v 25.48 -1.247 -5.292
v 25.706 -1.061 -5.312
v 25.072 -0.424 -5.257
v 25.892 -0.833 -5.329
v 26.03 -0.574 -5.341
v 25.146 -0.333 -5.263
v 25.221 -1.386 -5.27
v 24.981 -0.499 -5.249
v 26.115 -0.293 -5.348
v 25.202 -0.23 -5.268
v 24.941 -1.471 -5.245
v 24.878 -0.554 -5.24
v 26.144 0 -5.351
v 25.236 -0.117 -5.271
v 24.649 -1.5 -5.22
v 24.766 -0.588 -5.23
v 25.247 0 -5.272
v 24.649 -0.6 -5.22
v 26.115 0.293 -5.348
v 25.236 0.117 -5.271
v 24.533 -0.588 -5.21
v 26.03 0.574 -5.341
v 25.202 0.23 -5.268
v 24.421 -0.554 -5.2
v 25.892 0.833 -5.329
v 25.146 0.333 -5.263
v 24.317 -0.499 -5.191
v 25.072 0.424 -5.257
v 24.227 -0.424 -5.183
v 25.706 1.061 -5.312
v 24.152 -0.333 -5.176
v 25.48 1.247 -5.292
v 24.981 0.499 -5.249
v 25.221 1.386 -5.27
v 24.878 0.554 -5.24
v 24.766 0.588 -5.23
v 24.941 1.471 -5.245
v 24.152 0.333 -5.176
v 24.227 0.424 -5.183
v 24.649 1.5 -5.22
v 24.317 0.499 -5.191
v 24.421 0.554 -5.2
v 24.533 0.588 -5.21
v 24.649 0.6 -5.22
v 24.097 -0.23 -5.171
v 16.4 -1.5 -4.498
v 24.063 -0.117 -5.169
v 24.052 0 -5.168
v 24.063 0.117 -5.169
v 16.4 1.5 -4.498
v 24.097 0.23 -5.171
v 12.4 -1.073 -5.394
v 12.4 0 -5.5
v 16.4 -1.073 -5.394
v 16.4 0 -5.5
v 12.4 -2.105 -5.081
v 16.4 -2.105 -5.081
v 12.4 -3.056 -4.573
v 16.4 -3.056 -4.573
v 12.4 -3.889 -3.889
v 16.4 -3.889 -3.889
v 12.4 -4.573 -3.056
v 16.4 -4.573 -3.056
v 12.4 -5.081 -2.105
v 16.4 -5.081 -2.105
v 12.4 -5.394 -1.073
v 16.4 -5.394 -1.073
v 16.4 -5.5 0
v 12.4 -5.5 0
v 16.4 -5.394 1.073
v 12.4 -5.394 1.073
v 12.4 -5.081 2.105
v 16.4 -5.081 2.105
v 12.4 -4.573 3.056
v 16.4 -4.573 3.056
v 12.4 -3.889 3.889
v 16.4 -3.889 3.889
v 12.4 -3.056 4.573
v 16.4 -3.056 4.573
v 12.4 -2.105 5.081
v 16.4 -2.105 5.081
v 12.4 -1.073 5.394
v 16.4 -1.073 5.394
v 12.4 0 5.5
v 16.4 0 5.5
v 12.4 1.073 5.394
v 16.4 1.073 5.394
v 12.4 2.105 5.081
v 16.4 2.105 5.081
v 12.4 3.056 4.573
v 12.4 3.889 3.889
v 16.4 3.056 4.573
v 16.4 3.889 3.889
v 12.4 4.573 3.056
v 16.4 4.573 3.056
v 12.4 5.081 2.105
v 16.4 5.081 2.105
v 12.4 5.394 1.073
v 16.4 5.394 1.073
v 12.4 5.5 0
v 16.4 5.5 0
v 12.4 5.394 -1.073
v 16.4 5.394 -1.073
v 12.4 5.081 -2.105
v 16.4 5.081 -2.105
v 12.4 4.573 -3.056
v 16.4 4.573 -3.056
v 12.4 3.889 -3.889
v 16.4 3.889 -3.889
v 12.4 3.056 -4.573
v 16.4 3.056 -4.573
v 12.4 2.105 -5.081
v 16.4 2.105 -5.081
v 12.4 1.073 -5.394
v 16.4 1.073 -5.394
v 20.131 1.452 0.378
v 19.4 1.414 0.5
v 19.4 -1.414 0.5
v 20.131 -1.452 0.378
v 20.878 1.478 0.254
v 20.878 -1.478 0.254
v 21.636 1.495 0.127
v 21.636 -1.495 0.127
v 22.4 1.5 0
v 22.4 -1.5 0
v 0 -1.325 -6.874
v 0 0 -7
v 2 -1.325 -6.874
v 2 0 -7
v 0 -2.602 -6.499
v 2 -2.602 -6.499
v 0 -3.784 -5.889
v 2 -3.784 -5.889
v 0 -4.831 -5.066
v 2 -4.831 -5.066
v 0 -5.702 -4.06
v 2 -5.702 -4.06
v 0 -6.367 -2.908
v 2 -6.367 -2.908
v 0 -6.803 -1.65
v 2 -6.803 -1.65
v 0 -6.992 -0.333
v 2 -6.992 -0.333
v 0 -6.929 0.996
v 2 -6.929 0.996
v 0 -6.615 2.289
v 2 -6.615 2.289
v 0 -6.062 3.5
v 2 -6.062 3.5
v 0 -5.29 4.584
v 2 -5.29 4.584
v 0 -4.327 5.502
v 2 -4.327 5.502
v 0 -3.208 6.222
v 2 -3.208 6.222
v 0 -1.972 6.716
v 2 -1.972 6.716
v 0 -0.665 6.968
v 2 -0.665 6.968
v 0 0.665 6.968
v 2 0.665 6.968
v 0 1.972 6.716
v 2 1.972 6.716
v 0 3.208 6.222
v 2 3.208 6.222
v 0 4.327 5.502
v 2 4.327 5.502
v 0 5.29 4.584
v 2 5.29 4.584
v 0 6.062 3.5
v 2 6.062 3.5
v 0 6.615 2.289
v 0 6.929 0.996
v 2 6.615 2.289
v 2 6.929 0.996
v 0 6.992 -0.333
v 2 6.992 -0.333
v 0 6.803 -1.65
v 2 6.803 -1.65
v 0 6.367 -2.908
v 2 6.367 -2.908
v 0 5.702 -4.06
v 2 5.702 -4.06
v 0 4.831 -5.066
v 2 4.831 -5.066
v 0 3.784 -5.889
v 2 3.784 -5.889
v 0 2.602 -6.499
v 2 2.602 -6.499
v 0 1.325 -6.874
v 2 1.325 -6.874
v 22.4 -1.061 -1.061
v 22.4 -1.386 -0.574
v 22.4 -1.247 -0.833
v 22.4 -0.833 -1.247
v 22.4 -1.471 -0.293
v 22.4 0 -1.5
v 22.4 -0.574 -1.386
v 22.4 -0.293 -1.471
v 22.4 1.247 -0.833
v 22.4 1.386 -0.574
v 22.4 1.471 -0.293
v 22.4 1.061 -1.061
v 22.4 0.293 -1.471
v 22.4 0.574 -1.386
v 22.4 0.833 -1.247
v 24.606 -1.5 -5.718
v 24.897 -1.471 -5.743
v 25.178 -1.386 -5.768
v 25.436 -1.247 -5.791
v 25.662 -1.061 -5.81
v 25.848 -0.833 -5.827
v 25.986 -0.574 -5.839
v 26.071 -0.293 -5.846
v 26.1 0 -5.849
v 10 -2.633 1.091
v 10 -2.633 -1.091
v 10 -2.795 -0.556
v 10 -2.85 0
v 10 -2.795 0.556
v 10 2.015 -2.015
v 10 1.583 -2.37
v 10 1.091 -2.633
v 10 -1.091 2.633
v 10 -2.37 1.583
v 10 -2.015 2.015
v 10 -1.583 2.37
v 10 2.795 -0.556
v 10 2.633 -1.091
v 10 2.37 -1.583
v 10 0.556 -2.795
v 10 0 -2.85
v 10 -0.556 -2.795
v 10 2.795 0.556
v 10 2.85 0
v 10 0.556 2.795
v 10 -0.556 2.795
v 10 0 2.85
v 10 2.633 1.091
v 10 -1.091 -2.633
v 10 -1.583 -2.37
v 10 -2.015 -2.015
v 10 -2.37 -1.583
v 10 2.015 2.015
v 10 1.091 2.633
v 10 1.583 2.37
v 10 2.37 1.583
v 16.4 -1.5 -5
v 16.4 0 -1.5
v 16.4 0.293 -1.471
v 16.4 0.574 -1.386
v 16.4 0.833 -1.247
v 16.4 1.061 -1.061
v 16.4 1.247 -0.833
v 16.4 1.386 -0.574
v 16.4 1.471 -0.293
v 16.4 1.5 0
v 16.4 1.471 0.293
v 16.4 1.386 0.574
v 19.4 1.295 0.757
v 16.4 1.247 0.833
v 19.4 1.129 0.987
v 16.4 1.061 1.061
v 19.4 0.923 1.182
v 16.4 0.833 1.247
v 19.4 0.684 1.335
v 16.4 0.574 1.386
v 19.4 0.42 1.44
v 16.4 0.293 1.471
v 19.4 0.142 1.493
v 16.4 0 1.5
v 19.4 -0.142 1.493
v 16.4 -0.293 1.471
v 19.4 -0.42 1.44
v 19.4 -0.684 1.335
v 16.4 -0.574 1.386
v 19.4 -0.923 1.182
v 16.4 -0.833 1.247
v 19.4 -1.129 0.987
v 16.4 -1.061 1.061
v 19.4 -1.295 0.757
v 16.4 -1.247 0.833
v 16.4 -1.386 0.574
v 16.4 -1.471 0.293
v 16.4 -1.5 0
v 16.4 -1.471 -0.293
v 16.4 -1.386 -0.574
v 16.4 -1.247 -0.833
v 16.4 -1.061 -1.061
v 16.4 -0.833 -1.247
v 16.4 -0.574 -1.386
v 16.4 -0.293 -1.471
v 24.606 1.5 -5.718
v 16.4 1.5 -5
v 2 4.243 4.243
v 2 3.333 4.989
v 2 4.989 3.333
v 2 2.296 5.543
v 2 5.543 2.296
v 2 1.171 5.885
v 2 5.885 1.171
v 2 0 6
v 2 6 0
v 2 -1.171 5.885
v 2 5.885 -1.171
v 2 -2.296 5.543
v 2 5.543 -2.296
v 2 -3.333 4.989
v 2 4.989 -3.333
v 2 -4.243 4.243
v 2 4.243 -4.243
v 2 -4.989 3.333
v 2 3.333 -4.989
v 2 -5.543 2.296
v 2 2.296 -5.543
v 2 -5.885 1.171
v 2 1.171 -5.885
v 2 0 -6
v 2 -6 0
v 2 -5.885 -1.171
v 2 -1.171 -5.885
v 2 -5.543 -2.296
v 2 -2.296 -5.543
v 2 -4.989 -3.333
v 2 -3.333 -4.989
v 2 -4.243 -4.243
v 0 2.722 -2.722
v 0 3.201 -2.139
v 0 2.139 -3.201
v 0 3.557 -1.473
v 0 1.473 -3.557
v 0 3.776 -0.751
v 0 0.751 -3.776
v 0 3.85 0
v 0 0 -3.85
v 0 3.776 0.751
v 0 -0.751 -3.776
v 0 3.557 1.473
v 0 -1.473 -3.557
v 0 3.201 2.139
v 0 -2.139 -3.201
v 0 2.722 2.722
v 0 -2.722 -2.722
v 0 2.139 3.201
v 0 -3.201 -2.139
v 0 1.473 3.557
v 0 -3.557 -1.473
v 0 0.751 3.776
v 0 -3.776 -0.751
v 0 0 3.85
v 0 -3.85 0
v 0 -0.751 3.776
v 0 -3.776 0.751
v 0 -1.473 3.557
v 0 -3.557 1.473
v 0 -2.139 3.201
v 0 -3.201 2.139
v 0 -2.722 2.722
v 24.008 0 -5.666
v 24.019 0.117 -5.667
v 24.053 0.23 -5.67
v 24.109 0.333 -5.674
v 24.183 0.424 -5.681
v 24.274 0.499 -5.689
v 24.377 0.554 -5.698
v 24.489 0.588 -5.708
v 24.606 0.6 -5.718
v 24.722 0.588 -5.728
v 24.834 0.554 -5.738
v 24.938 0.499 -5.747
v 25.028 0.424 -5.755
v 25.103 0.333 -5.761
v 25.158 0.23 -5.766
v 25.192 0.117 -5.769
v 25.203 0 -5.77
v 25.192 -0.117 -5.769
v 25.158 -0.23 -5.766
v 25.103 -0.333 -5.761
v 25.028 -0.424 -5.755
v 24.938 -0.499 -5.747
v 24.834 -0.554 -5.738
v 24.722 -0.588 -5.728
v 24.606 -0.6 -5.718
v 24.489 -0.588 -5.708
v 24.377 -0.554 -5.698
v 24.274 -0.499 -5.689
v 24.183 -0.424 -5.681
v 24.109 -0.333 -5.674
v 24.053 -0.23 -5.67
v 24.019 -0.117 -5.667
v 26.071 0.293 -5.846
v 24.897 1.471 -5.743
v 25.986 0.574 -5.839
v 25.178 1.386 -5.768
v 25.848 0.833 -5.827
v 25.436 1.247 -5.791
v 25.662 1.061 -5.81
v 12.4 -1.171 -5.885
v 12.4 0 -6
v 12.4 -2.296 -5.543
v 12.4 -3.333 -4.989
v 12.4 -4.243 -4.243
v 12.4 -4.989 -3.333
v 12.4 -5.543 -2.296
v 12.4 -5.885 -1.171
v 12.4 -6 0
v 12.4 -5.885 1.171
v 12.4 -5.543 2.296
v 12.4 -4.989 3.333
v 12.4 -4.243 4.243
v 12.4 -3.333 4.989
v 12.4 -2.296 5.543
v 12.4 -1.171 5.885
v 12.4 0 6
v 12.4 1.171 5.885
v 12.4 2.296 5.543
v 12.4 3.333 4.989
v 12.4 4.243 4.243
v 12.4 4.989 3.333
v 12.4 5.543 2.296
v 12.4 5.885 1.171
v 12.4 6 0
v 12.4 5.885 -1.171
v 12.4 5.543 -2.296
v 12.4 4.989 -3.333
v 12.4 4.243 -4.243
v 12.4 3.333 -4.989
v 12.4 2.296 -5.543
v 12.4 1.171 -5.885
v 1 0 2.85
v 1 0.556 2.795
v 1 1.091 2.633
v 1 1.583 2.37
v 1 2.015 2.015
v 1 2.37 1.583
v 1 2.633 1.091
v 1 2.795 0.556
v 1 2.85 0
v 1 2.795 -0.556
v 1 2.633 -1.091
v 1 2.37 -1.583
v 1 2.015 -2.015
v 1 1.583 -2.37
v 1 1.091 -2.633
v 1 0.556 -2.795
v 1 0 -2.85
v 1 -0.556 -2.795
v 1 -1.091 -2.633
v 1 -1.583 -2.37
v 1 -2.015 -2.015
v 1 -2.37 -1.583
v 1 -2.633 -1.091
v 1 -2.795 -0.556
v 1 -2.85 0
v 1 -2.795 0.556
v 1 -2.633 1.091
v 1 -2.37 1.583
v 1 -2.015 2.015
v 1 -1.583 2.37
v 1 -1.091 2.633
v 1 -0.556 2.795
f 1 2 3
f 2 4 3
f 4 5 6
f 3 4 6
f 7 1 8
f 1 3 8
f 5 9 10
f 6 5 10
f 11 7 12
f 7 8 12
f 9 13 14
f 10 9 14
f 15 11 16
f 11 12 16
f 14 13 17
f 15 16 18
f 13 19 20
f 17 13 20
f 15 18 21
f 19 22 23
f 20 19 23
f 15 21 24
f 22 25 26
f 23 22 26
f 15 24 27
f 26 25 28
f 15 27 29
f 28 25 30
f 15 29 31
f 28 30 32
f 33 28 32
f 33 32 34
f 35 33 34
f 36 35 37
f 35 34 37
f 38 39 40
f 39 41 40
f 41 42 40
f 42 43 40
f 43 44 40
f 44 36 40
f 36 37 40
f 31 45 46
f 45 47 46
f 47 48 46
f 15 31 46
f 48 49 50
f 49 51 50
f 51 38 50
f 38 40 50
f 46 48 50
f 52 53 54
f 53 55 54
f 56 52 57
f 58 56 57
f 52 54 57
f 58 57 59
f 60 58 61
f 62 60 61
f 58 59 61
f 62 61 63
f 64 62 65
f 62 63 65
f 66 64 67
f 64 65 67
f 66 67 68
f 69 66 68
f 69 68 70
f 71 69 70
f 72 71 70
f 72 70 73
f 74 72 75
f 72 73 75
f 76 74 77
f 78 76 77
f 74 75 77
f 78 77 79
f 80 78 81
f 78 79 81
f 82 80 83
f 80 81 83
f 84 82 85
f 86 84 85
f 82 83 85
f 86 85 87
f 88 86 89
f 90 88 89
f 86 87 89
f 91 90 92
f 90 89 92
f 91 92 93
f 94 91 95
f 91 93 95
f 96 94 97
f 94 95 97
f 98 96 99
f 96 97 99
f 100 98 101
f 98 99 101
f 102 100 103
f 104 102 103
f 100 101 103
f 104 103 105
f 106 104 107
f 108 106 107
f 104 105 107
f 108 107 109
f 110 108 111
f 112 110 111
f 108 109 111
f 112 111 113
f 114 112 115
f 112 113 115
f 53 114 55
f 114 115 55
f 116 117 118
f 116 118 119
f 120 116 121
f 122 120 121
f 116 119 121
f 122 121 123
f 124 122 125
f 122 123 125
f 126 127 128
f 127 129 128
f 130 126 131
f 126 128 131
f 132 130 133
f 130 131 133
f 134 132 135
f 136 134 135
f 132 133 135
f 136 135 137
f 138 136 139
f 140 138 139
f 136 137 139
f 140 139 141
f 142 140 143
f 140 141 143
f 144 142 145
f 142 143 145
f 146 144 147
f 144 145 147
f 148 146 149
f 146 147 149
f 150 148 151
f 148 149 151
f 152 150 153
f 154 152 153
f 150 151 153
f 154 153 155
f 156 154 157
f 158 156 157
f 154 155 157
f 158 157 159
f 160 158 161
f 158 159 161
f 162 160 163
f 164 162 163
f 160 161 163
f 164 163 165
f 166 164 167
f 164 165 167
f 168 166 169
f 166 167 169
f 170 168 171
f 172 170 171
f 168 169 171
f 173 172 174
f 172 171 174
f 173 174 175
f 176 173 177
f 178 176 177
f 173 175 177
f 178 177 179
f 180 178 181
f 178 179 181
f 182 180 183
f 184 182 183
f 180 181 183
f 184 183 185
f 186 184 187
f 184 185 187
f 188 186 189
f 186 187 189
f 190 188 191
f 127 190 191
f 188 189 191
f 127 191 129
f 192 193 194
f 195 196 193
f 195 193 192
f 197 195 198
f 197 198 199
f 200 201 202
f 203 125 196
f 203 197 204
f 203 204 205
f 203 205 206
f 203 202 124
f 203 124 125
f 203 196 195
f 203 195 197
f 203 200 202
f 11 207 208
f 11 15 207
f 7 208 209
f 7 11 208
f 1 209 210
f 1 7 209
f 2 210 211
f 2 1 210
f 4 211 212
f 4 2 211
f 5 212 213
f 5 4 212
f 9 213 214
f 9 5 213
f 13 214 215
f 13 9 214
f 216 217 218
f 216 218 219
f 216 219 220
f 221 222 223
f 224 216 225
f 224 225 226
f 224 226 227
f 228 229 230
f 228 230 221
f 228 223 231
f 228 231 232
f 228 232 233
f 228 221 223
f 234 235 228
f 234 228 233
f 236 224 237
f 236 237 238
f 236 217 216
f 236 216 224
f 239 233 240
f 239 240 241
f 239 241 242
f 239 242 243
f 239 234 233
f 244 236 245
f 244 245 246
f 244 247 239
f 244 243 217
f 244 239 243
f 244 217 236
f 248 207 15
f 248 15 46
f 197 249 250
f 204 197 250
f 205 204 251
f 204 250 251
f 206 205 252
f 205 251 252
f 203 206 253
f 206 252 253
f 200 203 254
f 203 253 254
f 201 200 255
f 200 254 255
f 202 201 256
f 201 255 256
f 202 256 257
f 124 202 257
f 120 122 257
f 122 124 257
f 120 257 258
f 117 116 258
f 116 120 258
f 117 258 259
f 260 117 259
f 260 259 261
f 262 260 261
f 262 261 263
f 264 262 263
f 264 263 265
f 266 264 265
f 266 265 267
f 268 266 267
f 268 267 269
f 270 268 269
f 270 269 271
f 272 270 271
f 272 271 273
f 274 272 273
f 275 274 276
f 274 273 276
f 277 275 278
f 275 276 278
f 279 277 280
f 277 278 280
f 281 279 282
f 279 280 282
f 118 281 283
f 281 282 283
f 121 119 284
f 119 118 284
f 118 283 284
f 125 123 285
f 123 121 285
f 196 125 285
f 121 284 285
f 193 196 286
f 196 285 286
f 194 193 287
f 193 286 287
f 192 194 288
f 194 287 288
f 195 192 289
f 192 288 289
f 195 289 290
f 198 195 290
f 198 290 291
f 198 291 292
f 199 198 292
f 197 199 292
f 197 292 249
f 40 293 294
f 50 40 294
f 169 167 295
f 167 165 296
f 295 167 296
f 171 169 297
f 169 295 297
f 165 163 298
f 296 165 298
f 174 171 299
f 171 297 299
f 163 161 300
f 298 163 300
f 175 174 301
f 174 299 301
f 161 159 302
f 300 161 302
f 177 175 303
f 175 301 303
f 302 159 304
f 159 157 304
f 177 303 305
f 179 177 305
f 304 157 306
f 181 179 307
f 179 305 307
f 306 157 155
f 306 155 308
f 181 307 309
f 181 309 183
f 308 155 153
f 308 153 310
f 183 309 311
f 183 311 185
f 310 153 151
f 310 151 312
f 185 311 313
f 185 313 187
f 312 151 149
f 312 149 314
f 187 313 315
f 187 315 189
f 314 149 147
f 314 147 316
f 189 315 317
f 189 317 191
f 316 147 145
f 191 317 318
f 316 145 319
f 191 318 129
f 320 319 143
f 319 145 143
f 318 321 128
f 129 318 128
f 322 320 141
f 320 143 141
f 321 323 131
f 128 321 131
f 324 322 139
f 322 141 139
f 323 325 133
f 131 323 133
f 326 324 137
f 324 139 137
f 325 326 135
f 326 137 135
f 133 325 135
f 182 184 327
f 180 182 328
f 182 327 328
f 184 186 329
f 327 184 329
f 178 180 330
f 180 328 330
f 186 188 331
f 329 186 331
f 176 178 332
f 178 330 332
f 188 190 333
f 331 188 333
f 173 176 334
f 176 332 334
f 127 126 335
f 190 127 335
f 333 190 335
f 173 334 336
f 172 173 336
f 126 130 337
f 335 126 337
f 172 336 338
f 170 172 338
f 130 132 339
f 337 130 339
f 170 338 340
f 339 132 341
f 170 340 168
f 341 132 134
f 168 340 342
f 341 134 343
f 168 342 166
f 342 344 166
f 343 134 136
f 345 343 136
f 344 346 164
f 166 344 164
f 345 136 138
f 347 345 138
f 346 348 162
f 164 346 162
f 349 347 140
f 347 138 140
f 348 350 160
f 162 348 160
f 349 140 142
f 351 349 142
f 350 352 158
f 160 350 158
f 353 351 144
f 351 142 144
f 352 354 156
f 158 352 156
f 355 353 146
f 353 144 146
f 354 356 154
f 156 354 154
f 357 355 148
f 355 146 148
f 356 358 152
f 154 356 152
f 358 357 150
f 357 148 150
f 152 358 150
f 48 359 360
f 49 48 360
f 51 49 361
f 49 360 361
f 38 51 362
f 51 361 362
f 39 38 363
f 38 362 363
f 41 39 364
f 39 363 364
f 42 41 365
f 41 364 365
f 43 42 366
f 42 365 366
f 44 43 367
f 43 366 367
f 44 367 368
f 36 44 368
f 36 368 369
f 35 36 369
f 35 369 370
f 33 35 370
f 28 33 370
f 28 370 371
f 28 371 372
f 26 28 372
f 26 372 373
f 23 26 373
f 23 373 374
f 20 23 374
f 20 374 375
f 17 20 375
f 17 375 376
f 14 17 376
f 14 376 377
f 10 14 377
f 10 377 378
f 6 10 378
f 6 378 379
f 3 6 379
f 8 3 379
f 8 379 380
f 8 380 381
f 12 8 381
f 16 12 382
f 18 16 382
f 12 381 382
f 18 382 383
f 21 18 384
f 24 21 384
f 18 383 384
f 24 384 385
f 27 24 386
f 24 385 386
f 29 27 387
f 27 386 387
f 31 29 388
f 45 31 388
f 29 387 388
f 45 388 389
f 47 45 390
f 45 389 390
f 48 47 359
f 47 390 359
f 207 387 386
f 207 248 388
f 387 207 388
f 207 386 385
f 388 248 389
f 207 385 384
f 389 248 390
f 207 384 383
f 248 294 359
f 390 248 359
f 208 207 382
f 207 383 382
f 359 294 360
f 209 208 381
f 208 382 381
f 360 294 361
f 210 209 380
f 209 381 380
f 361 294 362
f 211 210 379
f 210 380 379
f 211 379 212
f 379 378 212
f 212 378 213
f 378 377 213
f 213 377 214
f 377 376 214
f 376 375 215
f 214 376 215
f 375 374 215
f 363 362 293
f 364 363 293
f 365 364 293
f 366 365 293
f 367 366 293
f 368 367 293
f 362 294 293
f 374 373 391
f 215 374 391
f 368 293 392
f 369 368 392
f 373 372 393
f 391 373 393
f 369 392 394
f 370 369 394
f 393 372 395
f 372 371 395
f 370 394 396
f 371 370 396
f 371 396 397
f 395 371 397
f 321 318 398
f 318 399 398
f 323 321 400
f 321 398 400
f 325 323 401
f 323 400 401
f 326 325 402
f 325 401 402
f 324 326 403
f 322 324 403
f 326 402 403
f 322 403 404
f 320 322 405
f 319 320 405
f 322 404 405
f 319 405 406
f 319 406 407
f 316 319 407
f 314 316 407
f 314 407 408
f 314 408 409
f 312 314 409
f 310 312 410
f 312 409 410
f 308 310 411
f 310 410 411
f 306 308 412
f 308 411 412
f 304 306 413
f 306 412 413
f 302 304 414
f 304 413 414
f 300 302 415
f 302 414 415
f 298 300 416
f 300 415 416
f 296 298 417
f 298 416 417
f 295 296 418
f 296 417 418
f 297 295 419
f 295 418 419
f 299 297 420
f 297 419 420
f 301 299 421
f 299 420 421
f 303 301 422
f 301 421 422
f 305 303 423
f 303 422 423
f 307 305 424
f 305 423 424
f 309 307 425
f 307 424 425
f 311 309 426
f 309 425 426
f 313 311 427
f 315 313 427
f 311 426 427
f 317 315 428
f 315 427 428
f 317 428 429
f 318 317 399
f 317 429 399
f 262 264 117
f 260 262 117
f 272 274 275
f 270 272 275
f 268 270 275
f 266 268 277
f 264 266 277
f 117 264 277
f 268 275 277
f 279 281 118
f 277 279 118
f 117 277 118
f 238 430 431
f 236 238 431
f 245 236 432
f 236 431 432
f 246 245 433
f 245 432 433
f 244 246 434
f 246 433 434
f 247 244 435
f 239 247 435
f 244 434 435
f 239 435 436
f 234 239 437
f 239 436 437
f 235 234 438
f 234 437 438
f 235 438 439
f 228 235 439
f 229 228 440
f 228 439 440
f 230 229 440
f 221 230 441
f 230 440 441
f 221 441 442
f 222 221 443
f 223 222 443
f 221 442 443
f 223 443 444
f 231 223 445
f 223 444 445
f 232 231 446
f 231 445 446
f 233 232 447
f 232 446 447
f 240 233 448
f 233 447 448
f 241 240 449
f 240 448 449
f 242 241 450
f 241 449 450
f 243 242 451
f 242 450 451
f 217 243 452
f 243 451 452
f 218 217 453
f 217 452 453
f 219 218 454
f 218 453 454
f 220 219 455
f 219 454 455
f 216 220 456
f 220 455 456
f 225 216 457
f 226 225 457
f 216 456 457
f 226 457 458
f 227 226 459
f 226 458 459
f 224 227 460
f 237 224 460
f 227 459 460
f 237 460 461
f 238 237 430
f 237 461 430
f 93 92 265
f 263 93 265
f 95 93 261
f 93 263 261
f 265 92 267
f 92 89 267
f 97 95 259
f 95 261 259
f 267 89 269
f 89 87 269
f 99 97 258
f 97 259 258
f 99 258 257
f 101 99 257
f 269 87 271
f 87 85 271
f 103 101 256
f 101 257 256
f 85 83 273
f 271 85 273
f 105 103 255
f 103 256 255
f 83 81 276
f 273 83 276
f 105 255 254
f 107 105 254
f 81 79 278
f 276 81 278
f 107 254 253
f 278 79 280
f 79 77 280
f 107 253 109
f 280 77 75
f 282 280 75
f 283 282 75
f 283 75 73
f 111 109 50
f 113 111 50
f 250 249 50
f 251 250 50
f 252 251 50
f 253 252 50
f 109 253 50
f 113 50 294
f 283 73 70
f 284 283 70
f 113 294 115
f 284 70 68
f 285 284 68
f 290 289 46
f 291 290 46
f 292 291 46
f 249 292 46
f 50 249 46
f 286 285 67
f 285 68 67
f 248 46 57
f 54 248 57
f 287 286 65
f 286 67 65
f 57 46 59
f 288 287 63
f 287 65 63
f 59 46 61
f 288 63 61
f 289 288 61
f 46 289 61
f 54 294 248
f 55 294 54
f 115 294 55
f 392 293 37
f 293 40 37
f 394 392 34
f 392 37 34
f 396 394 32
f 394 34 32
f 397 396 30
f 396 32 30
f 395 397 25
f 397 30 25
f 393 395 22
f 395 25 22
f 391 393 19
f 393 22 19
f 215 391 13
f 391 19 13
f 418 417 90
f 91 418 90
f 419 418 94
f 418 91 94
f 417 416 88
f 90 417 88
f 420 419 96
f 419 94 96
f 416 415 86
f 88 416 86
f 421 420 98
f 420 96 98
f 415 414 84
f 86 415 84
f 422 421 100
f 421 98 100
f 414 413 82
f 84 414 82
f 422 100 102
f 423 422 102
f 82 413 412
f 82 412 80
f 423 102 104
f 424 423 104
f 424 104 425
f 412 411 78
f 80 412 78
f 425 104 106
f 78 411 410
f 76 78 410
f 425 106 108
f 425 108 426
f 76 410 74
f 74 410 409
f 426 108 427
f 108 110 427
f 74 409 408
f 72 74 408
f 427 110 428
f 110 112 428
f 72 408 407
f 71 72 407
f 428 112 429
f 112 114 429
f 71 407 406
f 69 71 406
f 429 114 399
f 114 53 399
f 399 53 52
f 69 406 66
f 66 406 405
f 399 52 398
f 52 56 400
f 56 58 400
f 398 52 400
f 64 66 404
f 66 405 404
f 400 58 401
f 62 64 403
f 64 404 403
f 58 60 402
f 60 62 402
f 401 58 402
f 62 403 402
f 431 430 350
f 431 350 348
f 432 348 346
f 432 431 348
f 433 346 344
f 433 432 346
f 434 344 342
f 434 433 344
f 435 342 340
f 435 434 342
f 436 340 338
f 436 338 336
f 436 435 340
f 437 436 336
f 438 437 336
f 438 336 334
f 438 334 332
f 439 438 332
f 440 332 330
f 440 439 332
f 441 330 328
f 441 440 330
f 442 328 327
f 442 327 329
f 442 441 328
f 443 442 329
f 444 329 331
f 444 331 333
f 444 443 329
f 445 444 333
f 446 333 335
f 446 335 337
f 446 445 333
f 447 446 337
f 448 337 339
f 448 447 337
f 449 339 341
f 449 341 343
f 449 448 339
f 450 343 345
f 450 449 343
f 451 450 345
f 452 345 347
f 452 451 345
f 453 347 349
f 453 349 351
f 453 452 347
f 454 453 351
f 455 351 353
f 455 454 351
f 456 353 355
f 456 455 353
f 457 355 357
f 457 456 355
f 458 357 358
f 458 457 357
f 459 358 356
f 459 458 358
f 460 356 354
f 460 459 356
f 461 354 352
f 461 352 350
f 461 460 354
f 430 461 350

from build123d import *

# Parameters (mm, degrees)
SKETCH2_R               = 2.85
CUT_EXTRUDE1_DEPTH      = 10
CHAMFER1_SIZE           = 1
SKETCH4_R               = 1.5
BOSS_EXTRUDE1_DEPTH     = 6
CUT_EXTRUDE2_DEPTH      = 25.489997958
CUT_EXTRUDE2_DEPTH_BACK = 25.489997958
BOSS_EXTRUDE2_DEPTH     = 1.5
FILLET1_R               = 1.5
SKETCH7_R               = 0.6
CUT_EXTRUDE3_DEPTH      = 3


with BuildPart() as part:
    # Sketch1 → Revolve1 (revolve)
    with BuildSketch(Plane(origin=(0, 0, 0), x_dir=(1, 0, 0), z_dir=(0, 1, 0))):
        Polygon((0, 0), (0, 7), (2, 7), (2, 6), (12.4, 6), (12.4, 5.5), (16.4, 5.5), (16.4, 0), align=None)
    revolve(axis=Axis((16.4, 0, 0), (-1, 0, 0)))

    # Sketch2 → Cut-Extrude1 (cut)
    with BuildSketch(Plane.ZY):
        Circle(SKETCH2_R)
    extrude(amount=-CUT_EXTRUDE1_DEPTH, mode=Mode.SUBTRACT)

    # Chamfer1
    chamfer1_edges = [part.edges().sort_by_distance(p)[0] for p in [
        (0, 0, -2.85),
    ]]
    chamfer(chamfer1_edges, length=CHAMFER1_SIZE)

    # Sketch4 → Boss-Extrude1 (add)
    with BuildSketch(Plane(origin=(16.4, 0, 0), x_dir=(0, 0, -1), z_dir=(1, 0, 0))):
        Circle(SKETCH4_R)
    extrude(amount=BOSS_EXTRUDE1_DEPTH)

    # Sketch5 → Cut-Extrude2 (cut, two sides: drawn at the far end of the back side and taken through both)
    with BuildSketch(Plane(origin=(0, 0, 0), x_dir=(1, 0, 0), z_dir=(0, 1, 0)).offset(-CUT_EXTRUDE2_DEPTH_BACK)):
        Polygon((22.4, -1.5), (19.4, -1.5), (19.4, -0.5), (22.4, 0), align=None)
    extrude(amount=CUT_EXTRUDE2_DEPTH + CUT_EXTRUDE2_DEPTH_BACK, mode=Mode.SUBTRACT)

    # Sketch6 → Boss-Extrude2 (add, symmetric)
    with BuildSketch(Plane(origin=(0, 0, 0), x_dir=(1, 0, 0), z_dir=(0, 1, 0))):
        Polygon((16.4, 5), (26.1, 5.848640036), (26.143577871, 5.350542687), (16.4, 4.498090081), align=None)
    extrude(amount=BOSS_EXTRUDE2_DEPTH, both=True)

    # Fillet1
    fillet1_edges = [part.edges().sort_by_distance(p)[0] for p in [
        (26.121788936, 1.5, -5.599591362),
        (26.121788936, -1.5, -5.599591362),
    ]]
    fillet(fillet1_edges, radius=FILLET1_R - 0.0001)  # a hair under: the kernel refuses the full size

    # Sketch7 → Cut-Extrude3 (cut)
    with BuildSketch(Plane(origin=(-0.309544019, 0, -3.538104326), x_dir=(-0.9961946980917462, 0, 0.08715574274765167), z_dir=(-0.08715574274765167, 0, -0.9961946980917462))):
        with Locations((-25.010424187, 0)):
            Circle(SKETCH7_R)
    extrude(amount=-CUT_EXTRUDE3_DEPTH, mode=Mode.SUBTRACT)


solid = part.part
